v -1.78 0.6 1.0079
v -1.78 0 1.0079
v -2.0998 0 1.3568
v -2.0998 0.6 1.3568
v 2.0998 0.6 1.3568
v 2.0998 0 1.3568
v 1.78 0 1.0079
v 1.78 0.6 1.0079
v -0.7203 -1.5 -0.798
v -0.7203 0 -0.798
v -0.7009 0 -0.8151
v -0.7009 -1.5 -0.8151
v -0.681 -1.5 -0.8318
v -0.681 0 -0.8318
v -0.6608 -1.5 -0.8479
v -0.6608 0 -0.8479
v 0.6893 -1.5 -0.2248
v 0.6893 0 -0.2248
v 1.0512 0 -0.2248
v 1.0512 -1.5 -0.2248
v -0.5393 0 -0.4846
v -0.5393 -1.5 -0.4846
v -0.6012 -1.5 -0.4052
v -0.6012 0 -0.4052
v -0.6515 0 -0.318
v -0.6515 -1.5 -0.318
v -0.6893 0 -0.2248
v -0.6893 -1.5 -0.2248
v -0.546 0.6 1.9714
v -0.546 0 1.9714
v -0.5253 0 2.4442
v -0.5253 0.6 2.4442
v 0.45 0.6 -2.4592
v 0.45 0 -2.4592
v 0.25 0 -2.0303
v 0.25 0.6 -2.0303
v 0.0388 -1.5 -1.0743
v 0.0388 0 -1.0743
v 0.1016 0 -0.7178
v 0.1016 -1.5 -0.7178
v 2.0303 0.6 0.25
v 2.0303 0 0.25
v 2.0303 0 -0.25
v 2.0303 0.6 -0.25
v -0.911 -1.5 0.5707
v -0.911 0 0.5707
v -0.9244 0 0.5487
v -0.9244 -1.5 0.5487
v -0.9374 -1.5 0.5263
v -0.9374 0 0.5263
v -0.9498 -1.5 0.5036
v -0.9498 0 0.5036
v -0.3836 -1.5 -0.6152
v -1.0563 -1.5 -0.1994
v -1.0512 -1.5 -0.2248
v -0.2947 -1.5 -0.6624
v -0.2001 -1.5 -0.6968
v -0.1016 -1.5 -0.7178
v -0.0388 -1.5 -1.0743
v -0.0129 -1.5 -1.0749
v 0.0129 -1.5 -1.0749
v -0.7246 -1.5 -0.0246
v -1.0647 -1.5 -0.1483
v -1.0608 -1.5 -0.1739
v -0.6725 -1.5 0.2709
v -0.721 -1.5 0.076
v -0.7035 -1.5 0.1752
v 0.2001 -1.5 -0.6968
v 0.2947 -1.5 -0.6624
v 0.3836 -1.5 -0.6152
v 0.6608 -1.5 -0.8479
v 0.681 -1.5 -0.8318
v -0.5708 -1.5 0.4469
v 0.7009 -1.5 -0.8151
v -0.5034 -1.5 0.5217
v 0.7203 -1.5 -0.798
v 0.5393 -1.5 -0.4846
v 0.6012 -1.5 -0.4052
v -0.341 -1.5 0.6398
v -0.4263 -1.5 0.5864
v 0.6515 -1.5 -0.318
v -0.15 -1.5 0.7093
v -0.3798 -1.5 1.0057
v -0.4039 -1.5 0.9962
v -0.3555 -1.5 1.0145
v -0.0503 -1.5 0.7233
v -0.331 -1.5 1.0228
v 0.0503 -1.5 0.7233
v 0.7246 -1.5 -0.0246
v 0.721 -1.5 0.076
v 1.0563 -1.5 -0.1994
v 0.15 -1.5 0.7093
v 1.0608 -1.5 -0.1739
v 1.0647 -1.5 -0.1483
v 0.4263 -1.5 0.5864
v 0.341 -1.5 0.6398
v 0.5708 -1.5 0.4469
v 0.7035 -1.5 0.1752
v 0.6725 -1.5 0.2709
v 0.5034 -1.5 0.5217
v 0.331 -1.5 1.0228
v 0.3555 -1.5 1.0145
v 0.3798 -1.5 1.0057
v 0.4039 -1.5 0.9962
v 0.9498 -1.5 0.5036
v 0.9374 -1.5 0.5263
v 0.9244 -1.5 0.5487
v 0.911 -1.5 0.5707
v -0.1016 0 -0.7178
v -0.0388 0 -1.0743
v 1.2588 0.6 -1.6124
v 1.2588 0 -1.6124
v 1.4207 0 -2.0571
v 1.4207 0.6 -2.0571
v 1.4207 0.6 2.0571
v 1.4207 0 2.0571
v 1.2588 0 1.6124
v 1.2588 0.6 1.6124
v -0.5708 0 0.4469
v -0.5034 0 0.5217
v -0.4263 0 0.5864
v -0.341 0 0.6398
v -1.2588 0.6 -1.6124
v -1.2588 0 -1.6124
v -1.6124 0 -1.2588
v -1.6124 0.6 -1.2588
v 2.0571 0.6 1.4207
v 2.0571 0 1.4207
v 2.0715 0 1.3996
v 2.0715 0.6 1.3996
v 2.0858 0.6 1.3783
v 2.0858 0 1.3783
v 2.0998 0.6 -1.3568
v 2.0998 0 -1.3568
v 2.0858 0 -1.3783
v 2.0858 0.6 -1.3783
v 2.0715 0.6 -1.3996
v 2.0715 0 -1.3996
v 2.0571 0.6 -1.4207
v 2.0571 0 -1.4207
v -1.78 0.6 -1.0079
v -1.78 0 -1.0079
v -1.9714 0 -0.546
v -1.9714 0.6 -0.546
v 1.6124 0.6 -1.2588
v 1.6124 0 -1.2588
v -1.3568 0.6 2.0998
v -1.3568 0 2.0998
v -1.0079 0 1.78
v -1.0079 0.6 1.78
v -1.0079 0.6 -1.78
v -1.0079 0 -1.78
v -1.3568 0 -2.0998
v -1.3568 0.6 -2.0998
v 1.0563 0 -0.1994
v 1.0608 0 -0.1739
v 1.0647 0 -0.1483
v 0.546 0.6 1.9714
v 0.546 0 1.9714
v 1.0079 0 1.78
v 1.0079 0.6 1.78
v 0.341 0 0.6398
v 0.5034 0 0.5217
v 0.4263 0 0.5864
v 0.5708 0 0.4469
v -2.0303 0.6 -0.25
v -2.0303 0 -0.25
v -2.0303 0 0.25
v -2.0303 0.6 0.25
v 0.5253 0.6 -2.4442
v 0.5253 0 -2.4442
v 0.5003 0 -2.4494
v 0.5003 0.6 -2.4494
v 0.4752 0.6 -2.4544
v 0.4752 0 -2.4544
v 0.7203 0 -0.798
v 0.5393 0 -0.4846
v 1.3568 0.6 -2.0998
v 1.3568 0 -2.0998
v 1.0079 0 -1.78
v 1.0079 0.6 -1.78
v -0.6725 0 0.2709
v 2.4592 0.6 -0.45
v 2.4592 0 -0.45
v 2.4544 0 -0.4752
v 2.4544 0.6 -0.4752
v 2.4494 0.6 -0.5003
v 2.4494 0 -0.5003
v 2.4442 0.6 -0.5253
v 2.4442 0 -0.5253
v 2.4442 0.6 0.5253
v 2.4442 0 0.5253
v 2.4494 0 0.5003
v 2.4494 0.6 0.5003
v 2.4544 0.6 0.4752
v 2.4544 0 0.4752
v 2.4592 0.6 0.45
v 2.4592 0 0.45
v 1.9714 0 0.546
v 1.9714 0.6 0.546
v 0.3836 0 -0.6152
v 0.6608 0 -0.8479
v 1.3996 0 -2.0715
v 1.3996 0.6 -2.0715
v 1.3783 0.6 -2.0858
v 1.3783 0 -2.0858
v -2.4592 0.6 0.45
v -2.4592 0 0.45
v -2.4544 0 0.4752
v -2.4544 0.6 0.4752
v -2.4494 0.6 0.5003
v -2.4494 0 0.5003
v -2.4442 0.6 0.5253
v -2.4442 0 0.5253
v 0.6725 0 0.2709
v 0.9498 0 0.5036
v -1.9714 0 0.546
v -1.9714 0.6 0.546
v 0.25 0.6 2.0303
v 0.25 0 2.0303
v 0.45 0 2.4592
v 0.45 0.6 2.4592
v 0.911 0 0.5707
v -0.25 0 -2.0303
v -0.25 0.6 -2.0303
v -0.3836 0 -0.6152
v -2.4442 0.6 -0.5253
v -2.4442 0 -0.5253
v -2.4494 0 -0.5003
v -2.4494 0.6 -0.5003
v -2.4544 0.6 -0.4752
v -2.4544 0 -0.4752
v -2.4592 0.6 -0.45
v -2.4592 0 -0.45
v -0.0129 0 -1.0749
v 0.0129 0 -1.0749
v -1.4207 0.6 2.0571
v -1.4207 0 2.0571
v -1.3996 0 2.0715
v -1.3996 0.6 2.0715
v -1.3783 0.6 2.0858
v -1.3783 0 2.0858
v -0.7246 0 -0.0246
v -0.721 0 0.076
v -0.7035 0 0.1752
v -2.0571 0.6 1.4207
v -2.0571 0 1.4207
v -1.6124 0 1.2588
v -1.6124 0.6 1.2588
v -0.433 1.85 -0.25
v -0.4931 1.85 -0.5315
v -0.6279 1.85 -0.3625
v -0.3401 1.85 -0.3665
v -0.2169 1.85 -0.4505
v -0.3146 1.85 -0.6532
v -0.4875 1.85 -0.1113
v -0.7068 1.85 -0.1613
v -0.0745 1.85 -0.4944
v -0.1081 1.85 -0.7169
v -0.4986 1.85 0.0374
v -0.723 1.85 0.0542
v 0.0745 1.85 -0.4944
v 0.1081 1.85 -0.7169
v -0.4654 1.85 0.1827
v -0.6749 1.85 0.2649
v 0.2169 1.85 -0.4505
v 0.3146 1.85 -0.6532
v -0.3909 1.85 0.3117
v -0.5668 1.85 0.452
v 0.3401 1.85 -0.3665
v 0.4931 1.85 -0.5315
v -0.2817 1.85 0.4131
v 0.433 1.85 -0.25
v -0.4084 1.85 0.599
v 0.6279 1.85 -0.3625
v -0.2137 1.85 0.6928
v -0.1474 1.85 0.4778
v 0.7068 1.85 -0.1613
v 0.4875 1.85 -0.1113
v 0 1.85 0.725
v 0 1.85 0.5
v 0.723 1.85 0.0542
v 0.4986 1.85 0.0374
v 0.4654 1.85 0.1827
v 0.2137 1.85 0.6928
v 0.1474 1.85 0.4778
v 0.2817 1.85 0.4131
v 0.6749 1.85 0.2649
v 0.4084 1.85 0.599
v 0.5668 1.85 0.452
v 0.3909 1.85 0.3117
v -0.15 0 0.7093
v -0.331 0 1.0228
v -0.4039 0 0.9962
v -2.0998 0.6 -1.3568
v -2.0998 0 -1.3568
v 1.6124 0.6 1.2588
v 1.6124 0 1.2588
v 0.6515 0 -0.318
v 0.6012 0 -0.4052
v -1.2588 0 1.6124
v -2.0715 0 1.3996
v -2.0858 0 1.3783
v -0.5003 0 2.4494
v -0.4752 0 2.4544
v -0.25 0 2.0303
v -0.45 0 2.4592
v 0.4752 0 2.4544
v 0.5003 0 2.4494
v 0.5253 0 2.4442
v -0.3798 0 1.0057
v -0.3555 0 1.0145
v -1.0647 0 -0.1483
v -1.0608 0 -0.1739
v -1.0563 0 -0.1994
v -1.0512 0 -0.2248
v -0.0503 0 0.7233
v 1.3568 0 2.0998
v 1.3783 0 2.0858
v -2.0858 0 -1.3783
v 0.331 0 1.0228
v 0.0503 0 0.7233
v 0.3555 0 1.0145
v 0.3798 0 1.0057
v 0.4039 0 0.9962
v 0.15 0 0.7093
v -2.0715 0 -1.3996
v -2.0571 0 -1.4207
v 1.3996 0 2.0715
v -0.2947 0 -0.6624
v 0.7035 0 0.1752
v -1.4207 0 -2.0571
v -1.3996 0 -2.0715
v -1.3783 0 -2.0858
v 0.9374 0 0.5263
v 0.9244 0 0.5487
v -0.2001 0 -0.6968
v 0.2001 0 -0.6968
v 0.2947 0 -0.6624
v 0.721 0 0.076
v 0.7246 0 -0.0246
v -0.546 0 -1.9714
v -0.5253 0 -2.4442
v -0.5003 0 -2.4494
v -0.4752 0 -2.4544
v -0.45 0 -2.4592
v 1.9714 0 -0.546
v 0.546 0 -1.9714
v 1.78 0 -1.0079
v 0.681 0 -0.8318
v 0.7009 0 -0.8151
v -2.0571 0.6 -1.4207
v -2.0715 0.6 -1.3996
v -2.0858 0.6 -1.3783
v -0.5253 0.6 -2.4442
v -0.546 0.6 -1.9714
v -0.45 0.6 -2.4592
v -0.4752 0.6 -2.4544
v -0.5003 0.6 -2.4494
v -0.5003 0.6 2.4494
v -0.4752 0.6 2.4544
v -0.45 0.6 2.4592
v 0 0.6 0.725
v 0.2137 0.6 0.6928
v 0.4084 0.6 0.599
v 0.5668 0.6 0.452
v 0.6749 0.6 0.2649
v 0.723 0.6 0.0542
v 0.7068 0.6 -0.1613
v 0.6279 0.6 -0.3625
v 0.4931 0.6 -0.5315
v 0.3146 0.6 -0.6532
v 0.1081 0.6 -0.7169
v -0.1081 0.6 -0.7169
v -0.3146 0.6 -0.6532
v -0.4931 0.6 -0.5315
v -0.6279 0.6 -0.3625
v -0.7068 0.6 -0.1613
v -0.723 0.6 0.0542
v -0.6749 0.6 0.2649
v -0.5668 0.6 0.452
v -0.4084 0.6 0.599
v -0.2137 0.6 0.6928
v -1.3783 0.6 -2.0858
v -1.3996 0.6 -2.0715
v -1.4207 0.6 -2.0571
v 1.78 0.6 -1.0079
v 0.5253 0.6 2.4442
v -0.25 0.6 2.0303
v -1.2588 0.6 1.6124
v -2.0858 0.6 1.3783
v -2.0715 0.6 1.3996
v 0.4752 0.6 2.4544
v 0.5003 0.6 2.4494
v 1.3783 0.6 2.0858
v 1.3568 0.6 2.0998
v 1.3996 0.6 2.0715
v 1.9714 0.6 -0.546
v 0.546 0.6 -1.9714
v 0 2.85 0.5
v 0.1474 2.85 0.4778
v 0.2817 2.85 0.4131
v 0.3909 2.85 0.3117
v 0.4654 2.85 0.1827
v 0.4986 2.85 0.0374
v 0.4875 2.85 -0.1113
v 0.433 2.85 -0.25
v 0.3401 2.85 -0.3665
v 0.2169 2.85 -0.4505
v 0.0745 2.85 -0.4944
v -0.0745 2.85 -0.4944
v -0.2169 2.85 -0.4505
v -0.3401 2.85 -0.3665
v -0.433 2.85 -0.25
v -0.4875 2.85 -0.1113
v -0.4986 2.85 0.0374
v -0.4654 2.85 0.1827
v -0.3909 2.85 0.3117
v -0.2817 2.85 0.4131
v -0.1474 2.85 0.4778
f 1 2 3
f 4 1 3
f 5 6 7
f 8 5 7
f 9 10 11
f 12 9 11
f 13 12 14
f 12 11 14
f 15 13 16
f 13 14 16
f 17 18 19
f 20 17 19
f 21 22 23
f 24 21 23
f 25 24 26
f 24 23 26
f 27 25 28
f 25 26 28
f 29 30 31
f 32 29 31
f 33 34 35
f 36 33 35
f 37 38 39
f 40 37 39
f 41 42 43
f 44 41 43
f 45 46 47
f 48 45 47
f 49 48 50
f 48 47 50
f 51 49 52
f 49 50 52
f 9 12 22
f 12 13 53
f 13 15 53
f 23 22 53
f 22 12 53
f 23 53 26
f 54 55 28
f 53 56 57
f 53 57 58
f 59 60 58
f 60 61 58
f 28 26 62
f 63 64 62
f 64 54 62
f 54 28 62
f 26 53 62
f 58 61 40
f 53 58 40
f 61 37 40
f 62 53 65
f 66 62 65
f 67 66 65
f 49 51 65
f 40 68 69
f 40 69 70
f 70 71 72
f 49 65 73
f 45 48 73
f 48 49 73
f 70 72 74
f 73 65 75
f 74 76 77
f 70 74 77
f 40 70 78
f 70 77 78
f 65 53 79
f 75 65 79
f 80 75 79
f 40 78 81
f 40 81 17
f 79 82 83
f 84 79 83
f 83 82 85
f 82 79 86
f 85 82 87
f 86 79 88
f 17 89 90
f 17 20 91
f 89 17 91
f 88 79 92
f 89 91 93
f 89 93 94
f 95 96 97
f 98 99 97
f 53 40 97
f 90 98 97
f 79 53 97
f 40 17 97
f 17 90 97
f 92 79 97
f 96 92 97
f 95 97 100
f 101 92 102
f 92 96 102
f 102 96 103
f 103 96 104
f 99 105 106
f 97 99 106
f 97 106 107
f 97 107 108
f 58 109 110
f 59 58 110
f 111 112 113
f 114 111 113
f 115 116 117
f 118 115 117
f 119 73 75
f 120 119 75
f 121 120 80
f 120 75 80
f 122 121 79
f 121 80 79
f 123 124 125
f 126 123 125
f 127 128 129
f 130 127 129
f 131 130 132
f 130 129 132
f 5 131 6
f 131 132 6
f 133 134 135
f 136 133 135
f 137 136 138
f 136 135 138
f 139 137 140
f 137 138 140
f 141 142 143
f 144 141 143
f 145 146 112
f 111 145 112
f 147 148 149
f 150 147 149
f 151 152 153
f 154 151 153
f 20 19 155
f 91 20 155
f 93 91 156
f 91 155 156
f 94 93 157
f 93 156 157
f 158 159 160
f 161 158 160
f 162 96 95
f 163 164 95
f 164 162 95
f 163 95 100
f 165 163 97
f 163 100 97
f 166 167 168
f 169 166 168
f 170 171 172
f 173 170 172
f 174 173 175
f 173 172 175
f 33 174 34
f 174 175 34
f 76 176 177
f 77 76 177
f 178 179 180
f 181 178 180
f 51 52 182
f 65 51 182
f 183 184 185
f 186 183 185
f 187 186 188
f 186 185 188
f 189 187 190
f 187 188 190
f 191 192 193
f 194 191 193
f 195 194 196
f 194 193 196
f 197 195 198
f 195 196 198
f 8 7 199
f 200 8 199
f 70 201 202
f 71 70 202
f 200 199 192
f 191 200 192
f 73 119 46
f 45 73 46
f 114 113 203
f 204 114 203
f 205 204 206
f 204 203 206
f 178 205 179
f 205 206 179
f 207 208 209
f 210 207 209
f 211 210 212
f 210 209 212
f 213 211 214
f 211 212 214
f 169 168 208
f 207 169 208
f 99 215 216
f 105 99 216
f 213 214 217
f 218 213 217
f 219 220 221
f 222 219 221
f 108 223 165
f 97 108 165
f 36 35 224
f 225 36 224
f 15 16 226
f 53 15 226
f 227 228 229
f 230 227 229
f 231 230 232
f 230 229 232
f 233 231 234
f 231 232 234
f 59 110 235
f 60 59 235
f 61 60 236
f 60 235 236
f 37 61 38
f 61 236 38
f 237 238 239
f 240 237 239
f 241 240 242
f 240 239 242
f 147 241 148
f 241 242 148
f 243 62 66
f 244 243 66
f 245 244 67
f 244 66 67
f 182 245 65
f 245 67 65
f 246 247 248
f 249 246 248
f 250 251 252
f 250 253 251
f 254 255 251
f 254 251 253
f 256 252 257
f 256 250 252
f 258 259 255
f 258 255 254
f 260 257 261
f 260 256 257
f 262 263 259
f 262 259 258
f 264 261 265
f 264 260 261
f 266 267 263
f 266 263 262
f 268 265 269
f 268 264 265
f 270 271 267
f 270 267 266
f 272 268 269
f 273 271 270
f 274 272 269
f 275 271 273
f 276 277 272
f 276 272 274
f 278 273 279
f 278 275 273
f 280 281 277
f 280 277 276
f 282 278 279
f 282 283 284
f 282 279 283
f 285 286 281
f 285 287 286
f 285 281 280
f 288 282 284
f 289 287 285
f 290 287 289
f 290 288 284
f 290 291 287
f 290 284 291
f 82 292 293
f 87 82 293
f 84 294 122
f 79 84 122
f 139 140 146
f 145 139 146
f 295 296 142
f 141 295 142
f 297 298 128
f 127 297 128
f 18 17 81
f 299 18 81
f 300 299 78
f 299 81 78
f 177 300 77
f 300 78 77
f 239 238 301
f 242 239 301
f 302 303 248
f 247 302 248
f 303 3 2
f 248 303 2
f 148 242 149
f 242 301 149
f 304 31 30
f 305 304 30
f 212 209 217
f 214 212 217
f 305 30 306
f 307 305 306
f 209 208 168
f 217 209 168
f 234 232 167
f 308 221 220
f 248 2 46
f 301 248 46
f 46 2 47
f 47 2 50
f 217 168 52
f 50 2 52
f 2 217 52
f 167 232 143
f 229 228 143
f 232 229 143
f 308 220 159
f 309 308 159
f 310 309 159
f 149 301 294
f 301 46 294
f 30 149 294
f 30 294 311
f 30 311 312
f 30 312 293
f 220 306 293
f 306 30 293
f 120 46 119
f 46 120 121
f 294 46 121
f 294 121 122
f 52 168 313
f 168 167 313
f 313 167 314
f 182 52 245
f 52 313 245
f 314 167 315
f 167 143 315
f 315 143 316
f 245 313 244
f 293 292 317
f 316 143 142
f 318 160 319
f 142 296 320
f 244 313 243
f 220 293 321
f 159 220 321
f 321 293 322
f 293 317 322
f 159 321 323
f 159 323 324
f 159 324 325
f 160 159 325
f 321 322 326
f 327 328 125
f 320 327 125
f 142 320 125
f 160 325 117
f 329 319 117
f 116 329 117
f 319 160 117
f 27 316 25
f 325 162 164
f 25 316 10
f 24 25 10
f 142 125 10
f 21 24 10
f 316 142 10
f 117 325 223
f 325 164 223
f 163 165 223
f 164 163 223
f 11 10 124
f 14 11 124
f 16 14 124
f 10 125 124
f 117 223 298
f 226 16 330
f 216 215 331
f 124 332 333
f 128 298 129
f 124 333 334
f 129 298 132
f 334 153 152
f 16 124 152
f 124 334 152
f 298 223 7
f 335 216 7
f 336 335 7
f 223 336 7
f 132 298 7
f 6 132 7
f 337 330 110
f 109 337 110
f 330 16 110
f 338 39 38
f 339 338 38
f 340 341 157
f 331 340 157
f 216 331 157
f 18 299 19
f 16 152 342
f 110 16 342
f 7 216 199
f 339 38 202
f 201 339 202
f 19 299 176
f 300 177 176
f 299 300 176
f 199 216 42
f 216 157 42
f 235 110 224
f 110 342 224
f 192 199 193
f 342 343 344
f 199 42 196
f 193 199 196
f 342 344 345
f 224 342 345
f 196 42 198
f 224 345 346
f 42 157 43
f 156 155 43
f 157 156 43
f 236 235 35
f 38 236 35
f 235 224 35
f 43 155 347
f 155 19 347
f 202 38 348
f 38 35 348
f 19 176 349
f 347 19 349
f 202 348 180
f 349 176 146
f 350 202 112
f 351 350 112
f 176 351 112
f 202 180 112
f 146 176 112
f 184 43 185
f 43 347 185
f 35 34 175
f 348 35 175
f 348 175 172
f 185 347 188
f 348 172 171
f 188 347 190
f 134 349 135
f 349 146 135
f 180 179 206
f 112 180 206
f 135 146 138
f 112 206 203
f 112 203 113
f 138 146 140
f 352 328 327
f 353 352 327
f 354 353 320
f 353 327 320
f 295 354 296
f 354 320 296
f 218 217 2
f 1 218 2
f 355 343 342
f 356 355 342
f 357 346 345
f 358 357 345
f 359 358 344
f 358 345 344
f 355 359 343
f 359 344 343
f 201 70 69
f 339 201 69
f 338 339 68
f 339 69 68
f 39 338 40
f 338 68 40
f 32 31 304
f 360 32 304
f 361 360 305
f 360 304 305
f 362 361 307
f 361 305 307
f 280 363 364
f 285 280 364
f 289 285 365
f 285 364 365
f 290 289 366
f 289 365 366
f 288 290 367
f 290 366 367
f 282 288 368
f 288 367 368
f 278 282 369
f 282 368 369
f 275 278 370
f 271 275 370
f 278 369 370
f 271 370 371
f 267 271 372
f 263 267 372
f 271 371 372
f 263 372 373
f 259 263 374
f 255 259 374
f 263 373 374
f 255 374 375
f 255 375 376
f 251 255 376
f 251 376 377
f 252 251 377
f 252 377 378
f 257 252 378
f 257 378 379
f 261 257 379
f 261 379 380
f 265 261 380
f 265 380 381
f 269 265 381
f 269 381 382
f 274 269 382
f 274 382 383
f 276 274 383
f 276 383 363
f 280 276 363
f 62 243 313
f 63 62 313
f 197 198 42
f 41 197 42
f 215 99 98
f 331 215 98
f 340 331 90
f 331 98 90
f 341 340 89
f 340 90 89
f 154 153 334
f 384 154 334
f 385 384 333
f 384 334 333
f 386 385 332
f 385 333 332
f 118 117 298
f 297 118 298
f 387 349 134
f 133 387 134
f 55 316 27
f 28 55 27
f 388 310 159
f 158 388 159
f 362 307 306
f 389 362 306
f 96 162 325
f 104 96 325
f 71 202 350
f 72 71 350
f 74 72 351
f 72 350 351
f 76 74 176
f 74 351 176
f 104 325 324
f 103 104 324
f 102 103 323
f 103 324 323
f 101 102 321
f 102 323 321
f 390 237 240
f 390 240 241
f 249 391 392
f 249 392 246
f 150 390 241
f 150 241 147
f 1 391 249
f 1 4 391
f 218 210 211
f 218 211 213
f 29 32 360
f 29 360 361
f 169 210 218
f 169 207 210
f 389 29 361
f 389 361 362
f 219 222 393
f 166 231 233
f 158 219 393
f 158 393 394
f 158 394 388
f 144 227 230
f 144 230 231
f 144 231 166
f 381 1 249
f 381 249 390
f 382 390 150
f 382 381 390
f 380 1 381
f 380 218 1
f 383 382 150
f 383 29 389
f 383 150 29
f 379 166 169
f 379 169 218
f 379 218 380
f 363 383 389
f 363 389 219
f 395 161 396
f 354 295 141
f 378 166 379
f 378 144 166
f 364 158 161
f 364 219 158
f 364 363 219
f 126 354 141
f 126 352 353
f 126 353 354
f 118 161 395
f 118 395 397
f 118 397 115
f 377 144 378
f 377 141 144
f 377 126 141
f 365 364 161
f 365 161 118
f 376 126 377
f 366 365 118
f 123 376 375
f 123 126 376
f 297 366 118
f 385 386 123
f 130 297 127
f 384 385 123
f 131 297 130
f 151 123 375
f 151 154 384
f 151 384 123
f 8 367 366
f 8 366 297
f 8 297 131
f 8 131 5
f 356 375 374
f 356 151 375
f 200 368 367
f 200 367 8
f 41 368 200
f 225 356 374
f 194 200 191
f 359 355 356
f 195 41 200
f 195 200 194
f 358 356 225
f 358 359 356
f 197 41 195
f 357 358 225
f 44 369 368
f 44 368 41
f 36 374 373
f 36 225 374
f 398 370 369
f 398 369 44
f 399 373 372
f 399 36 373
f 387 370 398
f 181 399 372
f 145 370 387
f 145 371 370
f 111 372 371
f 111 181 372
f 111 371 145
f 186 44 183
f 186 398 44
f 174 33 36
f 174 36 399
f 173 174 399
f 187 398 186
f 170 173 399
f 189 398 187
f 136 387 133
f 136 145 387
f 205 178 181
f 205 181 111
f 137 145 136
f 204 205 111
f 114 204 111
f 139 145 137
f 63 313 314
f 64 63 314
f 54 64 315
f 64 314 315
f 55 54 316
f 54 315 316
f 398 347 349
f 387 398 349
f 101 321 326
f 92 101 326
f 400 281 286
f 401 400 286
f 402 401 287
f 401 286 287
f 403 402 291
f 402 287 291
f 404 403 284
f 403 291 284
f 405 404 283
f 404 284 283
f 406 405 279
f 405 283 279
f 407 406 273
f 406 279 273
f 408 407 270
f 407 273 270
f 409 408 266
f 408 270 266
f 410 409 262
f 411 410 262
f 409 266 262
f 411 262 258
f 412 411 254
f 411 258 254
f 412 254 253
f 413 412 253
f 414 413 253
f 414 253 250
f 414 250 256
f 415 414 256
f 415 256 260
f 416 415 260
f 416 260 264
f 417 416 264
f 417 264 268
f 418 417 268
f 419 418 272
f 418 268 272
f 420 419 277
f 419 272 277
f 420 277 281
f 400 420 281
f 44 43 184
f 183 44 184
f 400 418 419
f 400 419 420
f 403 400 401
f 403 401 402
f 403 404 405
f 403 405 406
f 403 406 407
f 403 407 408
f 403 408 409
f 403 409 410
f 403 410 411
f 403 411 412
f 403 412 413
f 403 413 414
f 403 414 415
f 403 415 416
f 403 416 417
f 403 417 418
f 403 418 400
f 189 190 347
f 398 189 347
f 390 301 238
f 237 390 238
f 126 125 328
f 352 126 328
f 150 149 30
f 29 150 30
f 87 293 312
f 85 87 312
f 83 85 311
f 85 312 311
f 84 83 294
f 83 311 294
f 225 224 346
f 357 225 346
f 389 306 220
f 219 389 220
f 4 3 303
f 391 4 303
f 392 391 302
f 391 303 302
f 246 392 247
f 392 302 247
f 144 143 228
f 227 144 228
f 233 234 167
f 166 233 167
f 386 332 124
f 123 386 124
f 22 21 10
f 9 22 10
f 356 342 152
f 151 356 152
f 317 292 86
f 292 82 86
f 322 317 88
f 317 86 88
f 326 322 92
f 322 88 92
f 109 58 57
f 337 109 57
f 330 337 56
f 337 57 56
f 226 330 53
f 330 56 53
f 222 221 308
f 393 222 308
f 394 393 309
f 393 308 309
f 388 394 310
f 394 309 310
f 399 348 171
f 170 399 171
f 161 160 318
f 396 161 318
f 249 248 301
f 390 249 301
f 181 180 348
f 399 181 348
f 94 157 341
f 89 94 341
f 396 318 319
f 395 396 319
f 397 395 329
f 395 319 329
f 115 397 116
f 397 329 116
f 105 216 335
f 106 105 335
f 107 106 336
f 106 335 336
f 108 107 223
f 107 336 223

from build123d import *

# Parameters (mm, degrees)
BOSS_EXTRUDE1_DEPTH      = 0.6
BOSS_EXTRUDE2_DEPTH      = 1.25
BOSS_EXTRUDE2_DEPTH_BACK = 2.1
SKETCH2_R                = 0.725
SKETCH3_R                = 0.5
BOSS_EXTRUDE3_DEPTH      = 1
BOSS_EXTRUDE4_DEPTH      = 1.5


# Read off the part's stored shape, not the designer's step: Boss-Extrude1
with BuildPart() as part:
    # Boss-Extrude1 outline → Boss-Extrude1 (new body)
    with BuildSketch(Plane(origin=(0, 0, 0), x_dir=(1, 0, 0), z_dir=(0, 1, 0))):
        with BuildLine():
            Line((2.459166525, -0.45), (2.030265141, -0.25))
            Line((2.030265141, -0.25), (2.030265141, 0.25))
            Line((2.030265141, 0.25), (2.459166525, 0.45))
            ThreePointArc((2.459166525, 0.45), (2.451963201, 0.487725805), (2.444181164, 0.525336497))
            Line((2.444181164, 0.525336497), (1.971391268, 0.54597895))
            Line((1.971391268, 0.54597895), (1.780049552, 1.007918716))
            Line((1.780049552, 1.007918716), (2.099766075, 1.356828076))
            ThreePointArc((2.099766075, 1.356828076), (2.078674031, 1.388925583), (2.057091378, 1.420695275))
            Line((2.057091378, 1.420695275), (1.612390944, 1.258837554))
            Line((1.612390944, 1.258837554), (1.258837554, 1.612390944))
            Line((1.258837554, 1.612390944), (1.420695275, 2.057091378))
            ThreePointArc((1.420695275, 2.057091378), (1.388925583, 2.078674031), (1.356828076, 2.099766075))
            Line((1.356828076, 2.099766075), (1.007918716, 1.780049552))
            Line((1.007918716, 1.780049552), (0.54597895, 1.971391268))
            Line((0.54597895, 1.971391268), (0.525336497, 2.444181164))
            ThreePointArc((0.525336497, 2.444181164), (0.487725805, 2.451963201), (0.45, 2.459166525))
            Line((0.45, 2.459166525), (0.25, 2.030265141))
            Line((0.25, 2.030265141), (-0.25, 2.030265141))
            Line((-0.25, 2.030265141), (-0.45, 2.459166525))
            ThreePointArc((-0.45, 2.459166525), (-0.487725805, 2.451963201), (-0.525336497, 2.444181164))
            Line((-0.525336497, 2.444181164), (-0.54597895, 1.971391268))
            Line((-0.54597895, 1.971391268), (-1.007918716, 1.780049552))
            Line((-1.007918716, 1.780049552), (-1.356828076, 2.099766075))
            ThreePointArc((-1.356828076, 2.099766075), (-1.388925583, 2.078674031), (-1.420695275, 2.057091378))
            Line((-1.420695275, 2.057091378), (-1.258837554, 1.612390944))
            Line((-1.258837554, 1.612390944), (-1.612390944, 1.258837554))
            Line((-1.612390944, 1.258837554), (-2.057091378, 1.420695275))
            ThreePointArc((-2.057091378, 1.420695275), (-2.078674031, 1.388925583), (-2.099766075, 1.356828076))
            Line((-2.099766075, 1.356828076), (-1.780049552, 1.007918716))
            Line((-1.780049552, 1.007918716), (-1.971391268, 0.54597895))
            Line((-1.971391268, 0.54597895), (-2.444181164, 0.525336497))
            ThreePointArc((-2.444181164, 0.525336497), (-2.451963201, 0.487725805), (-2.459166525, 0.45))
            Line((-2.459166525, 0.45), (-2.030265141, 0.25))
            Line((-2.030265141, 0.25), (-2.030265141, -0.25))
            Line((-2.030265141, -0.25), (-2.459166525, -0.45))
            ThreePointArc((-2.459166525, -0.45), (-2.451963201, -0.487725805), (-2.444181164, -0.525336497))
            Line((-2.444181164, -0.525336497), (-1.971391268, -0.54597895))
            Line((-1.971391268, -0.54597895), (-1.780049552, -1.007918716))
            Line((-1.780049552, -1.007918716), (-2.099766075, -1.356828076))
            ThreePointArc((-2.099766075, -1.356828076), (-2.078674031, -1.388925583), (-2.057091378, -1.420695275))
            Line((-2.057091378, -1.420695275), (-1.612390944, -1.258837554))
            Line((-1.612390944, -1.258837554), (-1.258837554, -1.612390944))
            Line((-1.258837554, -1.612390944), (-1.420695275, -2.057091378))
            ThreePointArc((-1.420695275, -2.057091378), (-1.388925583, -2.078674031), (-1.356828076, -2.099766075))
            Line((-1.356828076, -2.099766075), (-1.007918716, -1.780049552))
            Line((-1.007918716, -1.780049552), (-0.54597895, -1.971391268))
            Line((-0.54597895, -1.971391268), (-0.525336497, -2.444181164))
            ThreePointArc((-0.525336497, -2.444181164), (-0.487725805, -2.451963201), (-0.45, -2.459166525))
            Line((-0.45, -2.459166525), (-0.25, -2.030265141))
            Line((-0.25, -2.030265141), (0.25, -2.030265141))
            Line((0.25, -2.030265141), (0.45, -2.459166525))
            ThreePointArc((0.45, -2.459166525), (0.487725805, -2.451963201), (0.525336497, -2.444181164))
            Line((0.525336497, -2.444181164), (0.54597895, -1.971391268))
            Line((0.54597895, -1.971391268), (1.007918716, -1.780049552))
            Line((1.007918716, -1.780049552), (1.356828076, -2.099766075))
            ThreePointArc((1.356828076, -2.099766075), (1.388925583, -2.078674031), (1.420695275, -2.057091378))
            Line((1.420695275, -2.057091378), (1.258837554, -1.612390944))
            Line((1.258837554, -1.612390944), (1.612390944, -1.258837554))
            Line((1.612390944, -1.258837554), (2.057091378, -1.420695275))
            ThreePointArc((2.057091378, -1.420695275), (2.078674031, -1.388925583), (2.099766075, -1.356828076))
            Line((2.099766075, -1.356828076), (1.780049552, -1.007918716))
            Line((1.780049552, -1.007918716), (1.971391268, -0.54597895))
            Line((1.971391268, -0.54597895), (2.444181164, -0.525336497))
            ThreePointArc((2.444181164, -0.525336497), (2.451963201, -0.487725805), (2.459166525, -0.45))
        make_face()
    extrude(amount=BOSS_EXTRUDE1_DEPTH)

    # Sketch2 → Boss-Extrude2 (add, two sides: drawn at the far end of the back side and taken through both)
    with BuildSketch(Plane(origin=(0, 0.6, 0), x_dir=(1, 0, 0), z_dir=(0, 1, 0)).offset(-BOSS_EXTRUDE2_DEPTH_BACK)):
        with Locations(Location((0, 0, 0), (0, 0, 270))):
            Circle(SKETCH2_R)
    extrude(amount=BOSS_EXTRUDE2_DEPTH + BOSS_EXTRUDE2_DEPTH_BACK)

    # Sketch3 → Boss-Extrude3 (add)
    with BuildSketch(Plane(origin=(0, 1.85, 0), x_dir=(1, 0, 0), z_dir=(0, 1, 0))):
        with Locations(Location((0, 0, 0), (0, 0, 270))):
            Circle(SKETCH3_R)
    extrude(amount=BOSS_EXTRUDE3_DEPTH)

    # Sketch4 → Boss-Extrude4 (add)
    with BuildSketch(Plane(origin=(0, 0, 0), x_dir=(-1, 0, 0), z_dir=(0, -1, 0))):
        with BuildLine():
            Line((0.15, -0.709313048), (0.330979791, -1.022779242))
            ThreePointArc((0.330979791, -1.022779242), (0.367671654, -1.010169567), (0.403884594, -0.996244064))
            Line((0.403884594, -0.996244064), (0.341030972, -0.63978346))
            ThreePointArc((0.341030972, -0.63978346), (0.247964604, -0.68127715), (0.15, -0.709313048))
        make_face()
        with BuildLine():
            ThreePointArc((-0.403884594, -0.996244064), (-0.367671654, -1.010169567), (-0.330979791, -1.022779242))
            Line((-0.330979791, -1.022779242), (-0.15, -0.709313048))
            ThreePointArc((-0.15, -0.709313048), (-0.247964604, -0.68127715), (-0.341030972, -0.63978346))
            Line((-0.341030972, -0.63978346), (-0.403884594, -0.996244064))
        make_face()
        with BuildLine():
            Line((0.570844305, -0.446947177), (0.910975054, -0.570744646))
            ThreePointArc((0.910975054, -0.570744646), (0.930977309, -0.5375), (0.949766889, -0.503555216))
            Line((0.949766889, -0.503555216), (0.672489762, -0.270892081))
            ThreePointArc((0.672489762, -0.270892081), (0.627868418, -0.3625), (0.570844305, -0.446947177))
        make_face()
        with BuildLine():
            ThreePointArc((-0.949766889, -0.503555216), (-0.930977309, -0.5375), (-0.910975054, -0.570744646))
            Line((-0.910975054, -0.570744646), (-0.570844305, -0.446947177))
            ThreePointArc((-0.570844305, -0.446947177), (-0.627868418, -0.3625), (-0.672489762, -0.270892081))
            Line((-0.672489762, -0.270892081), (-0.949766889, -0.503555216))
        make_face()
        with BuildLine():
            ThreePointArc((0.689283119, 0.224752713), (0.713985621, 0.125894929), (0.724584216, 0.024550245))
            Line((0.724584216, 0.024550245), (1.064714965, 0.148347713))
            ThreePointArc((1.064714965, 0.148347713), (1.058668334, 0.186671791), (1.051242702, 0.224752713))
            Line((1.051242702, 0.224752713), (0.689283119, 0.224752713))
        make_face()
        with BuildLine():
            ThreePointArc((-1.051242702, 0.224752713), (-1.058668334, 0.186671791), (-1.064714965, 0.148347713))
            Line((-1.064714965, 0.148347713), (-0.724584216, 0.024550245))
            ThreePointArc((-0.724584216, 0.024550245), (-0.713985621, 0.125894929), (-0.689283119, 0.224752713))
            Line((-0.689283119, 0.224752713), (-1.051242702, 0.224752713))
        make_face()
        with BuildLine():
            ThreePointArc((0.383553243, 0.615233215), (0.466021017, 0.555382221), (0.539283119, 0.484560335))
            Line((0.539283119, 0.484560335), (0.72026291, 0.798026528))
            ThreePointArc((0.72026291, 0.798026528), (0.69099668, 0.823497776), (0.660830371, 0.847896351))
            Line((0.660830371, 0.847896351), (0.383553243, 0.615233215))
        make_face()
        with BuildLine():
            ThreePointArc((-0.660830371, 0.847896351), (-0.69099668, 0.823497776), (-0.72026291, 0.798026528))
            Line((-0.72026291, 0.798026528), (-0.539283119, 0.484560335))
            ThreePointArc((-0.539283119, 0.484560335), (-0.466021017, 0.555382221), (-0.383553243, 0.615233215))
            Line((-0.383553243, 0.615233215), (-0.660830371, 0.847896351))
        make_face()
        with BuildLine():
            ThreePointArc((-0.101645457, 0.717839258), (0, 0.725), (0.101645457, 0.717839258))
            Line((0.101645457, 0.717839258), (0.038791835, 1.074299862))
            ThreePointArc((0.038791835, 1.074299862), (0, 1.075), (-0.038791835, 1.074299862))
            Line((-0.038791835, 1.074299862), (-0.101645457, 0.717839258))
        make_face()
    extrude(amount=BOSS_EXTRUDE4_DEPTH)


solid = part.part
